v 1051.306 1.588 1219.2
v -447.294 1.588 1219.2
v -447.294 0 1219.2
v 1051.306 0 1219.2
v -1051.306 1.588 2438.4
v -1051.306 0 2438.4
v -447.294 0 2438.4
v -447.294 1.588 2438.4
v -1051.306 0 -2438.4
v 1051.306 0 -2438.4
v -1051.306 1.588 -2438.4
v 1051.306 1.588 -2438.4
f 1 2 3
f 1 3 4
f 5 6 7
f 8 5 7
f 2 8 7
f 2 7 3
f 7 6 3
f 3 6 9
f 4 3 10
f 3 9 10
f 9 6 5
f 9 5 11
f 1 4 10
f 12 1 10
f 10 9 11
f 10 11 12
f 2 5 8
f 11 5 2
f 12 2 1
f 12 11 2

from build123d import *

# Parameters (mm, degrees)
SKETCH1_W               = 2102.612
SKETCH1_H               = 4876.8
BOSS_EXTRUDE1_DEPTH     = 1.5875
SKETCH2_W               = 1498.6
SKETCH2_H               = 1219.2
CUT_EXTRUDE1_DEPTH      = 1
CUT_EXTRUDE1_DEPTH_BACK = 2.5875


with BuildPart() as part:
    # Sketch1 → Boss-Extrude1 (new body)
    with BuildSketch(Plane(origin=(0, 0, 0), x_dir=(1, 0, 0), z_dir=(0, 1, 0))):
        Rectangle(SKETCH1_W, SKETCH1_H)
    extrude(amount=BOSS_EXTRUDE1_DEPTH)

    # Sketch2 → Cut-Extrude1 (cut, two sides)
    with BuildSketch(Plane(origin=(0, 1.5875, 0), x_dir=(1, 0, 0), z_dir=(0, 1, 0))) as cut_extrude1_sk:
        with Locations((302.006, -1828.8)):
            Rectangle(SKETCH2_W, SKETCH2_H)
    extrude(amount=CUT_EXTRUDE1_DEPTH, mode=Mode.SUBTRACT)
    extrude(cut_extrude1_sk.sketch, amount=-CUT_EXTRUDE1_DEPTH_BACK, mode=Mode.SUBTRACT)


solid = part.part
